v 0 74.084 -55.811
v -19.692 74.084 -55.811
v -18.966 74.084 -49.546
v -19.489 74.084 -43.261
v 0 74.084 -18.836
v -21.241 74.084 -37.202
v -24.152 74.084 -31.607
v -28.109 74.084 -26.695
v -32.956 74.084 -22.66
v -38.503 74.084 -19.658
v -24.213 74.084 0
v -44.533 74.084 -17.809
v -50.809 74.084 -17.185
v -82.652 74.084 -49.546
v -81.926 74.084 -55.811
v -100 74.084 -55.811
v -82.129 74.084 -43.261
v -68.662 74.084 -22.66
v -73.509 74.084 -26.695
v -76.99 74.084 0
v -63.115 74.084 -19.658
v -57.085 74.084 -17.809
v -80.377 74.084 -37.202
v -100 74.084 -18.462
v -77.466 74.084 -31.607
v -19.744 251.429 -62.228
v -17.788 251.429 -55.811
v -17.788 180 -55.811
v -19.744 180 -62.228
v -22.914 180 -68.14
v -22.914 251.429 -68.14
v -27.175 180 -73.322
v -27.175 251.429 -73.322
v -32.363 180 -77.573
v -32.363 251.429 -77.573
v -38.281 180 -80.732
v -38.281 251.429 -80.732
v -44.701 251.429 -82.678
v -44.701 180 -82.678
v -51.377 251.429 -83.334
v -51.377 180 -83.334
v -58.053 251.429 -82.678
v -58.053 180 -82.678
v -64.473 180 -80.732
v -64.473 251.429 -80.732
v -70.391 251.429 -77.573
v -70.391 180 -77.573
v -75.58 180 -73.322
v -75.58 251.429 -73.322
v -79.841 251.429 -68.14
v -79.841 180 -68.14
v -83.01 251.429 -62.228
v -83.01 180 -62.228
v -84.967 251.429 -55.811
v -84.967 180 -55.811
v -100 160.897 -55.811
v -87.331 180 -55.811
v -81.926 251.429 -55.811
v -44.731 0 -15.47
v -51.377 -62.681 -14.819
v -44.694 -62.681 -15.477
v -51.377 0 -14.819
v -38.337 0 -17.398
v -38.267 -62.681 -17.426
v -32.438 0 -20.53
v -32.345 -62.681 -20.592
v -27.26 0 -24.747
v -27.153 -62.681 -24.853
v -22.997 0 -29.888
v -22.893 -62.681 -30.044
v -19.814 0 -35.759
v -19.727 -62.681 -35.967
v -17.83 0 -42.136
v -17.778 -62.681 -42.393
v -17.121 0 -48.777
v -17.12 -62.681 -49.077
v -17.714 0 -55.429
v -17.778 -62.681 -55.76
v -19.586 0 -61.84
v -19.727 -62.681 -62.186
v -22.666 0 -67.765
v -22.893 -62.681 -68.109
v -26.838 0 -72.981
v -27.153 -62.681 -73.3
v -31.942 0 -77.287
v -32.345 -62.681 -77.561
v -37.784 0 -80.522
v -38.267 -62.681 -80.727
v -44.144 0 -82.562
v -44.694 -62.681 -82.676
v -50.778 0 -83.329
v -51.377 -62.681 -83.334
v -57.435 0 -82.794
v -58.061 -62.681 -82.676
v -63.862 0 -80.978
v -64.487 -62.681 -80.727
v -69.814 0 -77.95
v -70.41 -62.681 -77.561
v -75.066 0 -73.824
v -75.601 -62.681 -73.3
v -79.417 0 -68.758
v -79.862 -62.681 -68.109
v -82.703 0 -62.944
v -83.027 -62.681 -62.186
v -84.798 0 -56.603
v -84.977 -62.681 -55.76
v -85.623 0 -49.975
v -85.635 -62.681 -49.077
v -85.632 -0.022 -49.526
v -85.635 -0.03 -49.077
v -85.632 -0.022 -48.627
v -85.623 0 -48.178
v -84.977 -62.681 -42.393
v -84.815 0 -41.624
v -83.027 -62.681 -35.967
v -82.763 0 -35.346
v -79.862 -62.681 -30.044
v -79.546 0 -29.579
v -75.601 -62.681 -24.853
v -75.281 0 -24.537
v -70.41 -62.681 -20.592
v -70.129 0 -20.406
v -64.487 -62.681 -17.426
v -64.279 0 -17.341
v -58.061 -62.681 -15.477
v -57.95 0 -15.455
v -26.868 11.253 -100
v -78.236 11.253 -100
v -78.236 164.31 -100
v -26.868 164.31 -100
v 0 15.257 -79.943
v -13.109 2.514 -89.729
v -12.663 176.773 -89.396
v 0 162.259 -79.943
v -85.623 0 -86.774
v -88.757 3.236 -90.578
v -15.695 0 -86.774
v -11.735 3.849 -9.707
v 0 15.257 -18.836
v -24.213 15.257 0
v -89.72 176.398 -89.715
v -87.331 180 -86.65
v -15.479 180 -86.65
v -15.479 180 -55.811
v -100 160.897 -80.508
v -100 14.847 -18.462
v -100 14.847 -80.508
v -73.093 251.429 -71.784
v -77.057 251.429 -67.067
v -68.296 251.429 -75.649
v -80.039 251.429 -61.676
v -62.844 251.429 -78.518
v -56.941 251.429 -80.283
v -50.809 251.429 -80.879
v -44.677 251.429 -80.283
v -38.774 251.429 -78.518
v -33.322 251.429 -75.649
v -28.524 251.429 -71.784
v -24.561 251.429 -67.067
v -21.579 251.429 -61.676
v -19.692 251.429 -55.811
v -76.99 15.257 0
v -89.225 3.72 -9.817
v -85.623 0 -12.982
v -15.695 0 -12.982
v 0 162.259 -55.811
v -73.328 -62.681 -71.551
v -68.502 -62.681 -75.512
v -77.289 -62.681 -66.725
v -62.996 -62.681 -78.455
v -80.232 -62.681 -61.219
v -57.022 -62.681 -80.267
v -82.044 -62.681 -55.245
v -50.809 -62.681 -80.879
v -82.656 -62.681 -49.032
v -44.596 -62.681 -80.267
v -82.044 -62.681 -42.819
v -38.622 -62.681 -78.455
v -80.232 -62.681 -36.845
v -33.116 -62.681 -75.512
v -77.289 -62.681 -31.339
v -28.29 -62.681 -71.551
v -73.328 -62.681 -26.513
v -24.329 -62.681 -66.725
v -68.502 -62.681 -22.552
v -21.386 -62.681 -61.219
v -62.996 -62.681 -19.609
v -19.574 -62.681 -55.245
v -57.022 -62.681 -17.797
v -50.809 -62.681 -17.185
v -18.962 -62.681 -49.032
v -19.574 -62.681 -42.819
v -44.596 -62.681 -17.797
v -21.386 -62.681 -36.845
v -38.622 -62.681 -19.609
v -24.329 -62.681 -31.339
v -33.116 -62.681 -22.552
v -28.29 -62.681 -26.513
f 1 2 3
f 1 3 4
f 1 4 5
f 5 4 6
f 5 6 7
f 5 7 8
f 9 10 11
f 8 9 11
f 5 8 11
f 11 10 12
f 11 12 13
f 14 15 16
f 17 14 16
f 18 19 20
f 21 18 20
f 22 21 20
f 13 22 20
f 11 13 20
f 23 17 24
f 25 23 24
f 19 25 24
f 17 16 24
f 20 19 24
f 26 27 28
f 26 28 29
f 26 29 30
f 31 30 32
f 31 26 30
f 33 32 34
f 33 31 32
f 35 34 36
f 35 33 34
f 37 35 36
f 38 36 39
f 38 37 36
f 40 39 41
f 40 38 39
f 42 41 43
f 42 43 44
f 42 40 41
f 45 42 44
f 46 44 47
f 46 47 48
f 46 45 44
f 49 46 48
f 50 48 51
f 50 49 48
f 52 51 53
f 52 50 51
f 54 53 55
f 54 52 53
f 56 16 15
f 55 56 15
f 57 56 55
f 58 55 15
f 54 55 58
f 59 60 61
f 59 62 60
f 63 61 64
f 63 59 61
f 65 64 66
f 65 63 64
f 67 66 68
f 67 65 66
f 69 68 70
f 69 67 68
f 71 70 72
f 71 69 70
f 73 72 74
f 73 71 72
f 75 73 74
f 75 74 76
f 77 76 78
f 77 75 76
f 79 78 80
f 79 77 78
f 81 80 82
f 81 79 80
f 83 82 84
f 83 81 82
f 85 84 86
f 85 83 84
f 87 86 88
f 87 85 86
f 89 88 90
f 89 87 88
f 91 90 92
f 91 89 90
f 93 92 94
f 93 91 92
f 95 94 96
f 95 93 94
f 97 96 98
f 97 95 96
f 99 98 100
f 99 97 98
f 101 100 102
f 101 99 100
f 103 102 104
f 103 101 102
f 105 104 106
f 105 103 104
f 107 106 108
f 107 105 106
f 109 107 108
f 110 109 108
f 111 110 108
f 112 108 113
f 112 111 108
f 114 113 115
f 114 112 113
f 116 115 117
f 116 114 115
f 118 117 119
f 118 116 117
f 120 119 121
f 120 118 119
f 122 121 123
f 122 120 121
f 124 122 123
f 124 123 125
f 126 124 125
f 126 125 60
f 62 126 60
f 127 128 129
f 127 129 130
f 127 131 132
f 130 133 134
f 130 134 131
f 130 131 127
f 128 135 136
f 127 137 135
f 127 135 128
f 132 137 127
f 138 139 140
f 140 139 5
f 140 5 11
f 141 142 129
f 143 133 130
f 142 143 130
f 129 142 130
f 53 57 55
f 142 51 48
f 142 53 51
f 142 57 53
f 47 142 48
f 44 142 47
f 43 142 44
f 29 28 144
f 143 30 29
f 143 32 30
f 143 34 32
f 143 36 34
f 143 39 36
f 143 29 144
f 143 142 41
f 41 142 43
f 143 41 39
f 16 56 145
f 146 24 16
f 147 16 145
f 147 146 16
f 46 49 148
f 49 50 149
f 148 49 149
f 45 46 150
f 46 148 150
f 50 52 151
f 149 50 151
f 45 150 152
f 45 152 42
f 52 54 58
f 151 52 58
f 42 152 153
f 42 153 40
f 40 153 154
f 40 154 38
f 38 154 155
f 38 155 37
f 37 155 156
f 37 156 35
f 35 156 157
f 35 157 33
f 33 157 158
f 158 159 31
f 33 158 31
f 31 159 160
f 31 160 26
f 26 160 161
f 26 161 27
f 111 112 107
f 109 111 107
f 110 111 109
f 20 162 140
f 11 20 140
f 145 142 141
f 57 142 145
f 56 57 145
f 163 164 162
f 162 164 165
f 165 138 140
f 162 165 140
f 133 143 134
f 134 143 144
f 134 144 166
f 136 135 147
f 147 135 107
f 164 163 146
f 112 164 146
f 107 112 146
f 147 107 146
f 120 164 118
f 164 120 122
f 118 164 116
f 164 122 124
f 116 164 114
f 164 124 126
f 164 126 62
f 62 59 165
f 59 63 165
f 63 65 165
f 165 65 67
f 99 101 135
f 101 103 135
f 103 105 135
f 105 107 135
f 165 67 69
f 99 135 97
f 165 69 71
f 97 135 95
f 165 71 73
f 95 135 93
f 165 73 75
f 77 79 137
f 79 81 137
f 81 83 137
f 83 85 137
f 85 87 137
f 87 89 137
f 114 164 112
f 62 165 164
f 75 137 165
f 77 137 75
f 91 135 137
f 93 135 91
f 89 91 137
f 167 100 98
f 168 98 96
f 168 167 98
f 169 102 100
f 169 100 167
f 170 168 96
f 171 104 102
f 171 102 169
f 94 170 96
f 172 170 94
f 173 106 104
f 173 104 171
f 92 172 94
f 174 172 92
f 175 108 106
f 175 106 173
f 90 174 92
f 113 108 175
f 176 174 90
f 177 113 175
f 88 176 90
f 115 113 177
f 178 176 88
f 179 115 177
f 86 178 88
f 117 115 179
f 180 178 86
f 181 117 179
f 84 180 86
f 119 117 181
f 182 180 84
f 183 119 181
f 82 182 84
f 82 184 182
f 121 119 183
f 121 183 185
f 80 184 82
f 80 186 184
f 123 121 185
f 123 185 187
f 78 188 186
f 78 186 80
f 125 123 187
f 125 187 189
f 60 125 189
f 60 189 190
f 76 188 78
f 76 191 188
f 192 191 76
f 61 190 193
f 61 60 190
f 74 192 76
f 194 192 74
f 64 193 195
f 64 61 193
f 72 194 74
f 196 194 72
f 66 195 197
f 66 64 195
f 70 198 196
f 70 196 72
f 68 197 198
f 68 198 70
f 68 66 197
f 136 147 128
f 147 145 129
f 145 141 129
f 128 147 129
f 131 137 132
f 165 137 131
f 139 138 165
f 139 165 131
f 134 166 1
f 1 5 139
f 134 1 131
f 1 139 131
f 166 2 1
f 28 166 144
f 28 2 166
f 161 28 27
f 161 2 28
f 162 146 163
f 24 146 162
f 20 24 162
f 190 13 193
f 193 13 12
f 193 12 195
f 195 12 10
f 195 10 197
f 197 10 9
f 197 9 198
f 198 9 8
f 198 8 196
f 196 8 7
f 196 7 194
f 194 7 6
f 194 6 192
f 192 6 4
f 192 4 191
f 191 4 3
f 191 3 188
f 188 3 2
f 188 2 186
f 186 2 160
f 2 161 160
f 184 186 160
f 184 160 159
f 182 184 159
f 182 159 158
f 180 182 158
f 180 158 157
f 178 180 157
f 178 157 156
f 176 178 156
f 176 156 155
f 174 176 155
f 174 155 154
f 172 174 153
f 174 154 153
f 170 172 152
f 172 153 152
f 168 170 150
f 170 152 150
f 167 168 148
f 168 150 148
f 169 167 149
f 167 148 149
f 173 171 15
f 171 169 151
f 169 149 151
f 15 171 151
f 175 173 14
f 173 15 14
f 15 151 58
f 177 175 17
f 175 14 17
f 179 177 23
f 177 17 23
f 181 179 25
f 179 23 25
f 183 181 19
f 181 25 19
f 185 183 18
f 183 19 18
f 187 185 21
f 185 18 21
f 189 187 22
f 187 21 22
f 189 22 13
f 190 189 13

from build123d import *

# Parameters (mm, degrees)
SKETCH1_W           = 100
SKETCH1_H           = 100
BOSS_EXTRUDE1_DEPTH = 180
SKETCH2_R           = 34.257790197
BOSS_EXTRUDE2_DEPTH = 350
SKETCH3_W           = 152.006357392
SKETCH3_H           = 282.452416457
CUT_EXTRUDE2_DEPTH  = 400
CUT_EXTRUDE3_DEPTH  = 400
CUT_EXTRUDE4_DEPTH  = 400
CUT_EXTRUDE5_DEPTH  = 400
SKETCH7_W           = 160.159381639
SKETCH7_H           = 147.362276113
CUT_EXTRUDE6_DEPTH  = 400
SKETCH8_W           = 147.310744502
SKETCH8_H           = 162.038906966
CUT_EXTRUDE7_DEPTH  = 400
SKETCH9_R           = 31.847293423
CUT_EXTRUDE8_DEPTH  = 400
SKETCH10_W          = 140.220962397
SKETCH10_H          = 212.033531124
CUT_EXTRUDE9_DEPTH  = 400


with BuildPart() as part:
    # Sketch1 → Boss-Extrude1 (new body)
    with BuildSketch(Plane(origin=(0, 0, 0), x_dir=(1, 0, 0), z_dir=(0, 1, 0))):
        with Locations((-50, 50)):
            Rectangle(SKETCH1_W, SKETCH1_H)
    extrude(amount=BOSS_EXTRUDE1_DEPTH)

    # Sketch2 → Boss-Extrude2 (add, symmetric)
    with BuildSketch(Plane(origin=(0, 180, 0), x_dir=(1, 0, 0), z_dir=(0, 1, 0))):
        with Locations(Location((-51.377291833, 49.076536384, 0), (0, 0, 270))):
            Circle(SKETCH2_R)
    extrude(amount=BOSS_EXTRUDE2_DEPTH, both=True)

    # Sketch3 → Cut-Extrude2 (cut)
    with BuildSketch(Plane(origin=(0, 0, 0), x_dir=(0, 0, -1), z_dir=(1, 0, 0))):
        with Locations((57.419900112, 502.274302507)):
            Rectangle(SKETCH3_W, SKETCH3_H)
    extrude(amount=-CUT_EXTRUDE2_DEPTH, mode=Mode.SUBTRACT)

    # Sketch4 → Cut-Extrude3 (cut)
    with BuildSketch(Plane(origin=(0, 0, 0), x_dir=(0, 0, -1), z_dir=(1, 0, 0))):
        Polygon((12.981970869, 0), (-8.994244796, 25.828096003), (-18.564506014, -15.259465835), align=None)
        Polygon((85.072517936, -1.448103984), (109.237639161, 19.113145112), (115.920034239, -3.267382694), align=None)
        Polygon((12.981970869, 180), (-8.994244796, 148.537596011), (-15.418178585, 193.219274892), align=None)
        Polygon((85.072517936, 181.854312784), (103.841225373, 159.795920888), (106.132549481, 198.647393934), align=None)
    extrude(amount=-CUT_EXTRUDE3_DEPTH, mode=Mode.SUBTRACT)

    # Sketch5 → Cut-Extrude4 (cut)
    with BuildSketch(Plane.XY):
        Polygon((-85.623287335, 0), (-106.370377984, 21.426392531), (-122.288861874, 3.209259887), (-93.526345261, -19.884701759), align=None)
        Polygon((-15.694988751, 0), (0, 15.257385304), (12.122677088, 15.257385304), (10.563067769, -19.884701759), align=None)
        Polygon((-87.166490339, 180.248071029), (-106.370377984, 151.29108453), (-117.705469457, 200.501115102), align=None)
        Polygon((-15.694988751, 180.248071029), (7.833767065, 153.279557508), (0, 193.941208308), align=None)
    extrude(amount=-CUT_EXTRUDE4_DEPTH, mode=Mode.SUBTRACT)

    # Sketch6 → Cut-Extrude5 (cut)
    with BuildSketch(Plane(origin=(0, 180, 0), x_dir=(1, 0, 0), z_dir=(0, 1, 0))):
        Polygon((-112.386997555, 28.400400964), (-64.261264503, -10.212759359), (-84.406366528, -15.51192827), (-124.649689542, -15.51192827), align=None)
        Polygon((-97.065537028, 135.861756084), (-119.37552445, 77.792688888), (-118.043343626, 64.347606737), (-66.428694172, 110.575168787), align=None)
        Polygon((-24.69640689, -21.815840769), (11.092108798, -8.97361337), (17.428316417, 32.393768119), (-38.531576846, -11.139157378), align=None)
        Polygon((-17.445484601, 140.804394854), (35.417473102, 107.262520599), (9.305452855, 72.996438725), (-31.724385352, 103.625272537), align=None)
    extrude(amount=-CUT_EXTRUDE5_DEPTH, mode=Mode.SUBTRACT)

    # Sketch7 → Cut-Extrude6 (cut)
    with BuildSketch(Plane.XY):
        with Locations((-66.123258915, -136.36252694)):
            Rectangle(SKETCH7_W, SKETCH7_H)
    extrude(amount=-CUT_EXTRUDE6_DEPTH, mode=Mode.SUBTRACT)

    # Sketch8 → Cut-Extrude7 (cut)
    with BuildSketch(Plane.XY):
        with Locations((-53.541153336, 332.448287589)):
            Rectangle(SKETCH8_W, SKETCH8_H)
    extrude(amount=-CUT_EXTRUDE7_DEPTH, mode=Mode.SUBTRACT)

    # Sketch9 → Cut-Extrude8 (cut)
    with BuildSketch(Plane(origin=(0, 251.428834106, 0), x_dir=(1, 0, 0), z_dir=(0, 1, 0))):
        with Locations(Location((-50.808993157, 49.032036374, 0), (0, 0, 270))):
            Circle(SKETCH9_R)
    extrude(amount=-CUT_EXTRUDE8_DEPTH, mode=Mode.SUBTRACT)

    # Sketch10 → Cut-Extrude9 (cut)
    with BuildSketch(Plane.ZY.offset(100)):
        with Locations((14.299084536, 180.100625535)):
            Rectangle(SKETCH10_W, SKETCH10_H)
    extrude(amount=-CUT_EXTRUDE9_DEPTH, mode=Mode.SUBTRACT)


solid = part.part
